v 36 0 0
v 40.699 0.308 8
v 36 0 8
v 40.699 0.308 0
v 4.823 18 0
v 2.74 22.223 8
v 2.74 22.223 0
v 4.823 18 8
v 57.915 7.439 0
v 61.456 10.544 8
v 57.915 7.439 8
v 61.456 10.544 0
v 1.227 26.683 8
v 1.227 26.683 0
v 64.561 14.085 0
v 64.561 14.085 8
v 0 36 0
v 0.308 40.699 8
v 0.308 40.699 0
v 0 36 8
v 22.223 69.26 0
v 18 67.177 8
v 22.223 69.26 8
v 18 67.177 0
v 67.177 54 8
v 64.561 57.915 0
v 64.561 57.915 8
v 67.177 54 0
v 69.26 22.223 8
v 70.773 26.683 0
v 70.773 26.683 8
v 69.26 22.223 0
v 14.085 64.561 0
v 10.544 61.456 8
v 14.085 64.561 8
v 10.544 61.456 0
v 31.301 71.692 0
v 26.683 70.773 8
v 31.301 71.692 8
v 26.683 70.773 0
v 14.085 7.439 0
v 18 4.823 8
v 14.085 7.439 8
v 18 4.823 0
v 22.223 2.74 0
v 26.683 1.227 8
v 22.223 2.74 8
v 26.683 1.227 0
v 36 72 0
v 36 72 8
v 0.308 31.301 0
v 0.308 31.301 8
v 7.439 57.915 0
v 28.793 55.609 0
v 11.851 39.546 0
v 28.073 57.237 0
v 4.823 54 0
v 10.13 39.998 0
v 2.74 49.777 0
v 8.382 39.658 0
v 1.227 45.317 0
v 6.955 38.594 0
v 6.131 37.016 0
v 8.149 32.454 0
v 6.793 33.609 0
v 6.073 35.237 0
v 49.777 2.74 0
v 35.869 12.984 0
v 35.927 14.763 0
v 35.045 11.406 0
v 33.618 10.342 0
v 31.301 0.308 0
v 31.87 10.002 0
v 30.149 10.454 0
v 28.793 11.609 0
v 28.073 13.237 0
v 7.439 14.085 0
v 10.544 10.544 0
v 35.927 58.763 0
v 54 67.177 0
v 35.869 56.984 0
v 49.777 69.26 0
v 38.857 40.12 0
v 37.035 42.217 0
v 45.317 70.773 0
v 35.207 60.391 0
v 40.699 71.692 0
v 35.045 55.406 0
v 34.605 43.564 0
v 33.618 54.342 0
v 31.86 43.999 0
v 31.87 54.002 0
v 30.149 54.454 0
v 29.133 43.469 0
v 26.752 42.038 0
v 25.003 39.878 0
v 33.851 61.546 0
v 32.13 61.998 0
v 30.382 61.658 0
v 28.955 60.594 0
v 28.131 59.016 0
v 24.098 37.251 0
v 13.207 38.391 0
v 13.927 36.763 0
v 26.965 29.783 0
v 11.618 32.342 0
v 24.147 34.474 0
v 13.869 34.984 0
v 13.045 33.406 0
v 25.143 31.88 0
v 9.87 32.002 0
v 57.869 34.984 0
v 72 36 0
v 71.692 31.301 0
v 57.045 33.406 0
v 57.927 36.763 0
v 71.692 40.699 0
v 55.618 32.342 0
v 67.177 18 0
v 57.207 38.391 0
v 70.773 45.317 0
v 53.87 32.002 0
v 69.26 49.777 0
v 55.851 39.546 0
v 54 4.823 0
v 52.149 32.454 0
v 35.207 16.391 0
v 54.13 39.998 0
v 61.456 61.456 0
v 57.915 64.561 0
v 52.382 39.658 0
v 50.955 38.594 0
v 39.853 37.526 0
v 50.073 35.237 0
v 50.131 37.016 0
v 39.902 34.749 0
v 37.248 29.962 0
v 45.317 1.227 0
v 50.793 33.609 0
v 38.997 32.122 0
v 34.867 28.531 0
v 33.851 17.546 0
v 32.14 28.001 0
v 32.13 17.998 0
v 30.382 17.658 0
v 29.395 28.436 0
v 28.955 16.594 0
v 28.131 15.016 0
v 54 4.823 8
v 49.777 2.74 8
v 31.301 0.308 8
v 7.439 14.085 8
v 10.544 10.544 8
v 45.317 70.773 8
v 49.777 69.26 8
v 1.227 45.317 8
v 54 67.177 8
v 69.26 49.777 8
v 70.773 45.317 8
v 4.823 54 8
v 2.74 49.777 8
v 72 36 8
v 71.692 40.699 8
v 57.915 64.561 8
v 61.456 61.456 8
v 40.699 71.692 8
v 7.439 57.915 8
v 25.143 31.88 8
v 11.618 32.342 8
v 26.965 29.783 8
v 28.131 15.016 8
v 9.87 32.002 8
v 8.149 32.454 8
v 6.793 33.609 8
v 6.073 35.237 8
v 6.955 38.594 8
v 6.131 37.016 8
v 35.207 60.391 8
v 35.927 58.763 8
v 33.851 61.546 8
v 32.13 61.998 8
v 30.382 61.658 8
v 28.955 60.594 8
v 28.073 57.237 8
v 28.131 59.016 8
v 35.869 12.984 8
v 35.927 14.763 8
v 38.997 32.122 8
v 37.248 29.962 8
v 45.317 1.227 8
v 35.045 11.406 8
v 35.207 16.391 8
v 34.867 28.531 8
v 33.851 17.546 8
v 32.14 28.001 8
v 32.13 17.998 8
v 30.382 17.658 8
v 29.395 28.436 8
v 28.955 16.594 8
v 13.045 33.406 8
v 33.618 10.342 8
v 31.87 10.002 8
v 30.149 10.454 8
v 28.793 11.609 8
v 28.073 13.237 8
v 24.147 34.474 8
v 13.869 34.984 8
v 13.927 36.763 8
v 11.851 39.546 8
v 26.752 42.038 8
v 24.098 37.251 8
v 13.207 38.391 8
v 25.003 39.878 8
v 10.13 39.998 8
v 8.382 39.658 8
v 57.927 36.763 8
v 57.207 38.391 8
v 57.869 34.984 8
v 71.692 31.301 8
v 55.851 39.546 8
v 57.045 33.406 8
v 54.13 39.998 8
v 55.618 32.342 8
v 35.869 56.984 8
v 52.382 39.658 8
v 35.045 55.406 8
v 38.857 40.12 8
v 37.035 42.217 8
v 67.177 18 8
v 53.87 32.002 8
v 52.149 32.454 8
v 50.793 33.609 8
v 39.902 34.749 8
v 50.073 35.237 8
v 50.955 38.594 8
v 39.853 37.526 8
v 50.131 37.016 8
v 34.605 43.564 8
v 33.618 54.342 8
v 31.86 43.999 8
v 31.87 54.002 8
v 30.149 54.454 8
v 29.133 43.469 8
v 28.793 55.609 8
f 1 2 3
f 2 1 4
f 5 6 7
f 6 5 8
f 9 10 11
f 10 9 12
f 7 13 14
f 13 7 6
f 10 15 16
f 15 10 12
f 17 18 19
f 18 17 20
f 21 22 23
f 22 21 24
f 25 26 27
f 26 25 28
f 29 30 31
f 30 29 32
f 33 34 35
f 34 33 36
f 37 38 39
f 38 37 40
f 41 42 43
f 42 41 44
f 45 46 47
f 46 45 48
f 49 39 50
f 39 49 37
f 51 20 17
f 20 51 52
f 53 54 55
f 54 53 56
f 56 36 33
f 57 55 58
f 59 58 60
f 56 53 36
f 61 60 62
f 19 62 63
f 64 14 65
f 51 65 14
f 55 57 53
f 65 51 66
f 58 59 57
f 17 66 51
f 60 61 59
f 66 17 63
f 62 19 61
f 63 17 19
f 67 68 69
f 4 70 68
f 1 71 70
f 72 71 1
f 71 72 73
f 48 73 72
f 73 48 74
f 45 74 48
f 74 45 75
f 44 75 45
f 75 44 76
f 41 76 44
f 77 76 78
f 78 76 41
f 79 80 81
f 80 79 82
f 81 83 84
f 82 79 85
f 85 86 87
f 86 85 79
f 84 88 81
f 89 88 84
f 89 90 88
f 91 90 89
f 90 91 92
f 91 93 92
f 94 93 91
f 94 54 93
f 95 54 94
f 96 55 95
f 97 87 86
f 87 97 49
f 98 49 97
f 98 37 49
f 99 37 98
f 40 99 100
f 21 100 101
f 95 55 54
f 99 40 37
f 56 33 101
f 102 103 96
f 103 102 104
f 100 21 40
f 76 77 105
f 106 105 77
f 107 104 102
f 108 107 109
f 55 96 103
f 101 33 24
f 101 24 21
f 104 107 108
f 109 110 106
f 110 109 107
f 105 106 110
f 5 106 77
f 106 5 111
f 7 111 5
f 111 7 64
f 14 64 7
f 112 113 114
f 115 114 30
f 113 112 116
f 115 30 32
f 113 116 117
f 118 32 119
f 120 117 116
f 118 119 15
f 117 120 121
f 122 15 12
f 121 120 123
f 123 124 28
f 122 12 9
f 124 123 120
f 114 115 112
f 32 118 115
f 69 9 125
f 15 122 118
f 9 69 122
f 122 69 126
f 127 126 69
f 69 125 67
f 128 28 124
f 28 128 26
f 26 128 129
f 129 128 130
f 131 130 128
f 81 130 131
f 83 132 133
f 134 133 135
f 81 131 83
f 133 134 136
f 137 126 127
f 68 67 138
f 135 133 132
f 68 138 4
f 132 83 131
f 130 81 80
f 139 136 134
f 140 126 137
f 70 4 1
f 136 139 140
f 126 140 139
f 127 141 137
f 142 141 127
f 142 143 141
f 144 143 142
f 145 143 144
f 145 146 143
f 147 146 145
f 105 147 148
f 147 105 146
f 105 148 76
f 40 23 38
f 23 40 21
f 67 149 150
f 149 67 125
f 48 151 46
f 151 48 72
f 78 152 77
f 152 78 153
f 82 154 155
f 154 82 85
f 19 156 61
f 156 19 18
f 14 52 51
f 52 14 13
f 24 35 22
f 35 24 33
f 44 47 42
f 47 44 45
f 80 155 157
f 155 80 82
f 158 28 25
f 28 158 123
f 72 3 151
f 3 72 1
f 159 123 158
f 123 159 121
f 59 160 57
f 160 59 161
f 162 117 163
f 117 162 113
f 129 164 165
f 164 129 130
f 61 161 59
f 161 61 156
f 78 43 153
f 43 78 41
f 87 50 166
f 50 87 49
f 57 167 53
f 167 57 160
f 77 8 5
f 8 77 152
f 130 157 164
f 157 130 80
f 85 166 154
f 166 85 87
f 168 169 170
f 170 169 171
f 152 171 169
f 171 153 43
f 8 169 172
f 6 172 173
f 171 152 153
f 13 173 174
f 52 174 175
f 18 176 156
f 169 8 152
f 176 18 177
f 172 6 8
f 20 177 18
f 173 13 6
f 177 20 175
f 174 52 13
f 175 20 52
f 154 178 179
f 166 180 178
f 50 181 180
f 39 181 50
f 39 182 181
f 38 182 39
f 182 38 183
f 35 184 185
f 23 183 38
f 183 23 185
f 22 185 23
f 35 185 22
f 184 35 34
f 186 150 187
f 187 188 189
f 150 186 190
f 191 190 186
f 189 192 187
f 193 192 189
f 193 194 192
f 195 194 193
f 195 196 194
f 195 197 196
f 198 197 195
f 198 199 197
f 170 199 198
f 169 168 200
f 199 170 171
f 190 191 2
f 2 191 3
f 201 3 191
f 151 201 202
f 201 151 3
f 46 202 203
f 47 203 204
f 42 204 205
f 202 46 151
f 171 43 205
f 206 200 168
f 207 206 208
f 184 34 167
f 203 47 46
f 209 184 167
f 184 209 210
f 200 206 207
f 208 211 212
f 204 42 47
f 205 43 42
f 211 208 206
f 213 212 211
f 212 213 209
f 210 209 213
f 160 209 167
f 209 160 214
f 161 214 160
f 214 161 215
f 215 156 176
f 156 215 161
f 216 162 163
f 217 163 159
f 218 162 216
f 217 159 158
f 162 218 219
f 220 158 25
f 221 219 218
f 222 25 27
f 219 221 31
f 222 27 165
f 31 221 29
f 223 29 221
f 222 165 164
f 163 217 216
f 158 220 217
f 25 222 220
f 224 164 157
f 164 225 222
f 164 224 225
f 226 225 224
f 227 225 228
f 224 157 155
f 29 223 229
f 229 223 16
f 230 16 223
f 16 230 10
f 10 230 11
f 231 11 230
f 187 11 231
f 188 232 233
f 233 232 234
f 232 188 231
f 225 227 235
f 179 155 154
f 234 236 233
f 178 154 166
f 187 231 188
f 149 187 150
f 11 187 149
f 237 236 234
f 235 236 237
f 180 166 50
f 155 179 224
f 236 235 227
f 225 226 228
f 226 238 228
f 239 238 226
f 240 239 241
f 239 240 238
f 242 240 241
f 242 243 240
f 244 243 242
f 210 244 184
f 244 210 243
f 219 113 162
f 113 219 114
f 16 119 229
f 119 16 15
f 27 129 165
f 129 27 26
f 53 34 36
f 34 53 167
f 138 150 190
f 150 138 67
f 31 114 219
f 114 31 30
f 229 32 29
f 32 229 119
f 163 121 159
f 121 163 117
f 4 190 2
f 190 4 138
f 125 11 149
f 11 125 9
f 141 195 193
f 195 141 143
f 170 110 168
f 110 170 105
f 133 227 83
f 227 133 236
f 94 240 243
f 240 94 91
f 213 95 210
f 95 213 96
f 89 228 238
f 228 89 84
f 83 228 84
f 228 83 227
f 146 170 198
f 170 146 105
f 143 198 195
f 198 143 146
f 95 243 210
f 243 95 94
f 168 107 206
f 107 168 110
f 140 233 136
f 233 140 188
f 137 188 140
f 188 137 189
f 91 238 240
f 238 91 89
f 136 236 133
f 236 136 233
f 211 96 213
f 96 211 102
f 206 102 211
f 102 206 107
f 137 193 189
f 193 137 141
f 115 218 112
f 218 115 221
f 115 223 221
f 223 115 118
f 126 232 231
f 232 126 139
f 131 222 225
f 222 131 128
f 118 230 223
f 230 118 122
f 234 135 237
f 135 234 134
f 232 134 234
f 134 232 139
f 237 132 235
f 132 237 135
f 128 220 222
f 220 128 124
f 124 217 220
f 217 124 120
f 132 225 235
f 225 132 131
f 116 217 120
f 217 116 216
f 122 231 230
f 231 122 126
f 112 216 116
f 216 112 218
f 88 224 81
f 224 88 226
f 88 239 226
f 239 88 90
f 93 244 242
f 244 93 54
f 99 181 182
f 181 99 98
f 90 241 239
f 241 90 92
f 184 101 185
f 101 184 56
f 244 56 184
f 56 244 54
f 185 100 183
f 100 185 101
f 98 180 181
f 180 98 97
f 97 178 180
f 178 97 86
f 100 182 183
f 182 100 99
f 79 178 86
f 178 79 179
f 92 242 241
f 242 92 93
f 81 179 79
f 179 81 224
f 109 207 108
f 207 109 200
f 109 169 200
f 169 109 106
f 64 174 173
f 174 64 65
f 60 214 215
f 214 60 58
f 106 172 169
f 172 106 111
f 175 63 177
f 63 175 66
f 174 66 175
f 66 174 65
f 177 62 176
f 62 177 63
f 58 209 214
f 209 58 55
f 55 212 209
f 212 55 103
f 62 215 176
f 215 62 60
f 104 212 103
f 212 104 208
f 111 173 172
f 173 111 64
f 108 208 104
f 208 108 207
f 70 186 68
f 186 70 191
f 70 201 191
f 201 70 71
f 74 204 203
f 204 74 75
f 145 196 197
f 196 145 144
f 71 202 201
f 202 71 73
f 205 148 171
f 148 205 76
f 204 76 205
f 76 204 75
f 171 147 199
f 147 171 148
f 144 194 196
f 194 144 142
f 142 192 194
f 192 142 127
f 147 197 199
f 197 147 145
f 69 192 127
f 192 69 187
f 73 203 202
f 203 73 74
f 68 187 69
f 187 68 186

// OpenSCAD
$fn = 32;

// ----------------------------------------------------------------------
// Cam plate: eccentric cam, base R36
// ----------------------------------------------------------------------

// --- parameters (mm) ---
base_r = 36;              // base circle radius
lobe_h = 8;               // cam lobe rise
bore_r = 8;               // shaft bore radius
plate_t = 8;              // plate thickness, Z (extrusion height)
ecc = 4;                  // disc eccentricity
ring_r = 22;              // lightening ring radius
bolt_r = 4;               // lightening hole radius

profile = [[72, 36], [71.692, 40.699], [70.773, 45.317], [69.26, 49.777], [67.177, 54], [64.561, 57.915], [61.456, 61.456], [57.915, 64.561], [54, 67.177], [49.777, 69.26], [45.317, 70.773], [40.699, 71.692], [36, 72], [31.301, 71.692], [26.683, 70.773], [22.223, 69.26], [18, 67.177], [14.085, 64.561], [10.544, 61.456], [7.439, 57.915], [4.823, 54], [2.74, 49.777], [1.227, 45.317], [0.308, 40.699], [0, 36], [0.308, 31.301], [1.227, 26.683], [2.74, 22.223], [4.823, 18], [7.439, 14.085], [10.544, 10.544], [14.085, 7.439], [18, 4.823], [22.223, 2.74], [26.683, 1.227], [31.301, 0.308], [36, 0], [40.699, 0.308], [45.317, 1.227], [49.777, 2.74], [54, 4.823], [57.915, 7.439], [61.456, 10.544], [64.561, 14.085], [67.177, 18], [69.26, 22.223], [70.773, 26.683], [71.692, 31.301]];  // primary outline, 48 points, counter clockwise
void_1 = [[39.853, 37.526], [38.857, 40.12], [37.035, 42.217], [34.605, 43.564], [31.86, 43.999], [29.133, 43.469], [26.752, 42.038], [25.003, 39.878], [24.098, 37.251], [24.147, 34.474], [25.143, 31.88], [26.965, 29.783], [29.395, 28.436], [32.14, 28.001], [34.867, 28.531], [37.248, 29.962], [38.997, 32.122], [39.902, 34.749]];  // shaft bore, 18 points
void_2 = [[57.927, 36.763], [57.207, 38.391], [55.851, 39.546], [54.13, 39.998], [52.382, 39.658], [50.955, 38.594], [50.131, 37.016], [50.073, 35.237], [50.793, 33.609], [52.149, 32.454], [53.87, 32.002], [55.618, 32.342], [57.045, 33.406], [57.869, 34.984]];  // lightening hole 1, 14 points
void_3 = [[35.927, 58.763], [35.207, 60.391], [33.851, 61.546], [32.13, 61.998], [30.382, 61.658], [28.955, 60.594], [28.131, 59.016], [28.073, 57.237], [28.793, 55.609], [30.149, 54.454], [31.87, 54.002], [33.618, 54.342], [35.045, 55.406], [35.869, 56.984]];  // lightening hole 2, 14 points
void_4 = [[13.927, 36.763], [13.207, 38.391], [11.851, 39.546], [10.13, 39.998], [8.382, 39.658], [6.955, 38.594], [6.131, 37.016], [6.073, 35.237], [6.793, 33.609], [8.149, 32.454], [9.87, 32.002], [11.618, 32.342], [13.045, 33.406], [13.869, 34.984]];  // lightening hole 3, 14 points
void_5 = [[35.927, 14.763], [35.207, 16.391], [33.851, 17.546], [32.13, 17.998], [30.382, 17.658], [28.955, 16.594], [28.131, 15.016], [28.073, 13.237], [28.793, 11.609], [30.149, 10.454], [31.87, 10.002], [33.618, 10.342], [35.045, 11.406], [35.869, 12.984]];  // lightening hole 4, 14 points

// --- the one profile operation ---
difference() {
  linear_extrude(height = plate_t) polygon(points = profile);
  translate([0, 0, -1])
    linear_extrude(height = plate_t + 2) polygon(points = void_1);
  translate([0, 0, -1])
    linear_extrude(height = plate_t + 2) polygon(points = void_2);
  translate([0, 0, -1])
    linear_extrude(height = plate_t + 2) polygon(points = void_3);
  translate([0, 0, -1])
    linear_extrude(height = plate_t + 2) polygon(points = void_4);
  translate([0, 0, -1])
    linear_extrude(height = plate_t + 2) polygon(points = void_5);
}
